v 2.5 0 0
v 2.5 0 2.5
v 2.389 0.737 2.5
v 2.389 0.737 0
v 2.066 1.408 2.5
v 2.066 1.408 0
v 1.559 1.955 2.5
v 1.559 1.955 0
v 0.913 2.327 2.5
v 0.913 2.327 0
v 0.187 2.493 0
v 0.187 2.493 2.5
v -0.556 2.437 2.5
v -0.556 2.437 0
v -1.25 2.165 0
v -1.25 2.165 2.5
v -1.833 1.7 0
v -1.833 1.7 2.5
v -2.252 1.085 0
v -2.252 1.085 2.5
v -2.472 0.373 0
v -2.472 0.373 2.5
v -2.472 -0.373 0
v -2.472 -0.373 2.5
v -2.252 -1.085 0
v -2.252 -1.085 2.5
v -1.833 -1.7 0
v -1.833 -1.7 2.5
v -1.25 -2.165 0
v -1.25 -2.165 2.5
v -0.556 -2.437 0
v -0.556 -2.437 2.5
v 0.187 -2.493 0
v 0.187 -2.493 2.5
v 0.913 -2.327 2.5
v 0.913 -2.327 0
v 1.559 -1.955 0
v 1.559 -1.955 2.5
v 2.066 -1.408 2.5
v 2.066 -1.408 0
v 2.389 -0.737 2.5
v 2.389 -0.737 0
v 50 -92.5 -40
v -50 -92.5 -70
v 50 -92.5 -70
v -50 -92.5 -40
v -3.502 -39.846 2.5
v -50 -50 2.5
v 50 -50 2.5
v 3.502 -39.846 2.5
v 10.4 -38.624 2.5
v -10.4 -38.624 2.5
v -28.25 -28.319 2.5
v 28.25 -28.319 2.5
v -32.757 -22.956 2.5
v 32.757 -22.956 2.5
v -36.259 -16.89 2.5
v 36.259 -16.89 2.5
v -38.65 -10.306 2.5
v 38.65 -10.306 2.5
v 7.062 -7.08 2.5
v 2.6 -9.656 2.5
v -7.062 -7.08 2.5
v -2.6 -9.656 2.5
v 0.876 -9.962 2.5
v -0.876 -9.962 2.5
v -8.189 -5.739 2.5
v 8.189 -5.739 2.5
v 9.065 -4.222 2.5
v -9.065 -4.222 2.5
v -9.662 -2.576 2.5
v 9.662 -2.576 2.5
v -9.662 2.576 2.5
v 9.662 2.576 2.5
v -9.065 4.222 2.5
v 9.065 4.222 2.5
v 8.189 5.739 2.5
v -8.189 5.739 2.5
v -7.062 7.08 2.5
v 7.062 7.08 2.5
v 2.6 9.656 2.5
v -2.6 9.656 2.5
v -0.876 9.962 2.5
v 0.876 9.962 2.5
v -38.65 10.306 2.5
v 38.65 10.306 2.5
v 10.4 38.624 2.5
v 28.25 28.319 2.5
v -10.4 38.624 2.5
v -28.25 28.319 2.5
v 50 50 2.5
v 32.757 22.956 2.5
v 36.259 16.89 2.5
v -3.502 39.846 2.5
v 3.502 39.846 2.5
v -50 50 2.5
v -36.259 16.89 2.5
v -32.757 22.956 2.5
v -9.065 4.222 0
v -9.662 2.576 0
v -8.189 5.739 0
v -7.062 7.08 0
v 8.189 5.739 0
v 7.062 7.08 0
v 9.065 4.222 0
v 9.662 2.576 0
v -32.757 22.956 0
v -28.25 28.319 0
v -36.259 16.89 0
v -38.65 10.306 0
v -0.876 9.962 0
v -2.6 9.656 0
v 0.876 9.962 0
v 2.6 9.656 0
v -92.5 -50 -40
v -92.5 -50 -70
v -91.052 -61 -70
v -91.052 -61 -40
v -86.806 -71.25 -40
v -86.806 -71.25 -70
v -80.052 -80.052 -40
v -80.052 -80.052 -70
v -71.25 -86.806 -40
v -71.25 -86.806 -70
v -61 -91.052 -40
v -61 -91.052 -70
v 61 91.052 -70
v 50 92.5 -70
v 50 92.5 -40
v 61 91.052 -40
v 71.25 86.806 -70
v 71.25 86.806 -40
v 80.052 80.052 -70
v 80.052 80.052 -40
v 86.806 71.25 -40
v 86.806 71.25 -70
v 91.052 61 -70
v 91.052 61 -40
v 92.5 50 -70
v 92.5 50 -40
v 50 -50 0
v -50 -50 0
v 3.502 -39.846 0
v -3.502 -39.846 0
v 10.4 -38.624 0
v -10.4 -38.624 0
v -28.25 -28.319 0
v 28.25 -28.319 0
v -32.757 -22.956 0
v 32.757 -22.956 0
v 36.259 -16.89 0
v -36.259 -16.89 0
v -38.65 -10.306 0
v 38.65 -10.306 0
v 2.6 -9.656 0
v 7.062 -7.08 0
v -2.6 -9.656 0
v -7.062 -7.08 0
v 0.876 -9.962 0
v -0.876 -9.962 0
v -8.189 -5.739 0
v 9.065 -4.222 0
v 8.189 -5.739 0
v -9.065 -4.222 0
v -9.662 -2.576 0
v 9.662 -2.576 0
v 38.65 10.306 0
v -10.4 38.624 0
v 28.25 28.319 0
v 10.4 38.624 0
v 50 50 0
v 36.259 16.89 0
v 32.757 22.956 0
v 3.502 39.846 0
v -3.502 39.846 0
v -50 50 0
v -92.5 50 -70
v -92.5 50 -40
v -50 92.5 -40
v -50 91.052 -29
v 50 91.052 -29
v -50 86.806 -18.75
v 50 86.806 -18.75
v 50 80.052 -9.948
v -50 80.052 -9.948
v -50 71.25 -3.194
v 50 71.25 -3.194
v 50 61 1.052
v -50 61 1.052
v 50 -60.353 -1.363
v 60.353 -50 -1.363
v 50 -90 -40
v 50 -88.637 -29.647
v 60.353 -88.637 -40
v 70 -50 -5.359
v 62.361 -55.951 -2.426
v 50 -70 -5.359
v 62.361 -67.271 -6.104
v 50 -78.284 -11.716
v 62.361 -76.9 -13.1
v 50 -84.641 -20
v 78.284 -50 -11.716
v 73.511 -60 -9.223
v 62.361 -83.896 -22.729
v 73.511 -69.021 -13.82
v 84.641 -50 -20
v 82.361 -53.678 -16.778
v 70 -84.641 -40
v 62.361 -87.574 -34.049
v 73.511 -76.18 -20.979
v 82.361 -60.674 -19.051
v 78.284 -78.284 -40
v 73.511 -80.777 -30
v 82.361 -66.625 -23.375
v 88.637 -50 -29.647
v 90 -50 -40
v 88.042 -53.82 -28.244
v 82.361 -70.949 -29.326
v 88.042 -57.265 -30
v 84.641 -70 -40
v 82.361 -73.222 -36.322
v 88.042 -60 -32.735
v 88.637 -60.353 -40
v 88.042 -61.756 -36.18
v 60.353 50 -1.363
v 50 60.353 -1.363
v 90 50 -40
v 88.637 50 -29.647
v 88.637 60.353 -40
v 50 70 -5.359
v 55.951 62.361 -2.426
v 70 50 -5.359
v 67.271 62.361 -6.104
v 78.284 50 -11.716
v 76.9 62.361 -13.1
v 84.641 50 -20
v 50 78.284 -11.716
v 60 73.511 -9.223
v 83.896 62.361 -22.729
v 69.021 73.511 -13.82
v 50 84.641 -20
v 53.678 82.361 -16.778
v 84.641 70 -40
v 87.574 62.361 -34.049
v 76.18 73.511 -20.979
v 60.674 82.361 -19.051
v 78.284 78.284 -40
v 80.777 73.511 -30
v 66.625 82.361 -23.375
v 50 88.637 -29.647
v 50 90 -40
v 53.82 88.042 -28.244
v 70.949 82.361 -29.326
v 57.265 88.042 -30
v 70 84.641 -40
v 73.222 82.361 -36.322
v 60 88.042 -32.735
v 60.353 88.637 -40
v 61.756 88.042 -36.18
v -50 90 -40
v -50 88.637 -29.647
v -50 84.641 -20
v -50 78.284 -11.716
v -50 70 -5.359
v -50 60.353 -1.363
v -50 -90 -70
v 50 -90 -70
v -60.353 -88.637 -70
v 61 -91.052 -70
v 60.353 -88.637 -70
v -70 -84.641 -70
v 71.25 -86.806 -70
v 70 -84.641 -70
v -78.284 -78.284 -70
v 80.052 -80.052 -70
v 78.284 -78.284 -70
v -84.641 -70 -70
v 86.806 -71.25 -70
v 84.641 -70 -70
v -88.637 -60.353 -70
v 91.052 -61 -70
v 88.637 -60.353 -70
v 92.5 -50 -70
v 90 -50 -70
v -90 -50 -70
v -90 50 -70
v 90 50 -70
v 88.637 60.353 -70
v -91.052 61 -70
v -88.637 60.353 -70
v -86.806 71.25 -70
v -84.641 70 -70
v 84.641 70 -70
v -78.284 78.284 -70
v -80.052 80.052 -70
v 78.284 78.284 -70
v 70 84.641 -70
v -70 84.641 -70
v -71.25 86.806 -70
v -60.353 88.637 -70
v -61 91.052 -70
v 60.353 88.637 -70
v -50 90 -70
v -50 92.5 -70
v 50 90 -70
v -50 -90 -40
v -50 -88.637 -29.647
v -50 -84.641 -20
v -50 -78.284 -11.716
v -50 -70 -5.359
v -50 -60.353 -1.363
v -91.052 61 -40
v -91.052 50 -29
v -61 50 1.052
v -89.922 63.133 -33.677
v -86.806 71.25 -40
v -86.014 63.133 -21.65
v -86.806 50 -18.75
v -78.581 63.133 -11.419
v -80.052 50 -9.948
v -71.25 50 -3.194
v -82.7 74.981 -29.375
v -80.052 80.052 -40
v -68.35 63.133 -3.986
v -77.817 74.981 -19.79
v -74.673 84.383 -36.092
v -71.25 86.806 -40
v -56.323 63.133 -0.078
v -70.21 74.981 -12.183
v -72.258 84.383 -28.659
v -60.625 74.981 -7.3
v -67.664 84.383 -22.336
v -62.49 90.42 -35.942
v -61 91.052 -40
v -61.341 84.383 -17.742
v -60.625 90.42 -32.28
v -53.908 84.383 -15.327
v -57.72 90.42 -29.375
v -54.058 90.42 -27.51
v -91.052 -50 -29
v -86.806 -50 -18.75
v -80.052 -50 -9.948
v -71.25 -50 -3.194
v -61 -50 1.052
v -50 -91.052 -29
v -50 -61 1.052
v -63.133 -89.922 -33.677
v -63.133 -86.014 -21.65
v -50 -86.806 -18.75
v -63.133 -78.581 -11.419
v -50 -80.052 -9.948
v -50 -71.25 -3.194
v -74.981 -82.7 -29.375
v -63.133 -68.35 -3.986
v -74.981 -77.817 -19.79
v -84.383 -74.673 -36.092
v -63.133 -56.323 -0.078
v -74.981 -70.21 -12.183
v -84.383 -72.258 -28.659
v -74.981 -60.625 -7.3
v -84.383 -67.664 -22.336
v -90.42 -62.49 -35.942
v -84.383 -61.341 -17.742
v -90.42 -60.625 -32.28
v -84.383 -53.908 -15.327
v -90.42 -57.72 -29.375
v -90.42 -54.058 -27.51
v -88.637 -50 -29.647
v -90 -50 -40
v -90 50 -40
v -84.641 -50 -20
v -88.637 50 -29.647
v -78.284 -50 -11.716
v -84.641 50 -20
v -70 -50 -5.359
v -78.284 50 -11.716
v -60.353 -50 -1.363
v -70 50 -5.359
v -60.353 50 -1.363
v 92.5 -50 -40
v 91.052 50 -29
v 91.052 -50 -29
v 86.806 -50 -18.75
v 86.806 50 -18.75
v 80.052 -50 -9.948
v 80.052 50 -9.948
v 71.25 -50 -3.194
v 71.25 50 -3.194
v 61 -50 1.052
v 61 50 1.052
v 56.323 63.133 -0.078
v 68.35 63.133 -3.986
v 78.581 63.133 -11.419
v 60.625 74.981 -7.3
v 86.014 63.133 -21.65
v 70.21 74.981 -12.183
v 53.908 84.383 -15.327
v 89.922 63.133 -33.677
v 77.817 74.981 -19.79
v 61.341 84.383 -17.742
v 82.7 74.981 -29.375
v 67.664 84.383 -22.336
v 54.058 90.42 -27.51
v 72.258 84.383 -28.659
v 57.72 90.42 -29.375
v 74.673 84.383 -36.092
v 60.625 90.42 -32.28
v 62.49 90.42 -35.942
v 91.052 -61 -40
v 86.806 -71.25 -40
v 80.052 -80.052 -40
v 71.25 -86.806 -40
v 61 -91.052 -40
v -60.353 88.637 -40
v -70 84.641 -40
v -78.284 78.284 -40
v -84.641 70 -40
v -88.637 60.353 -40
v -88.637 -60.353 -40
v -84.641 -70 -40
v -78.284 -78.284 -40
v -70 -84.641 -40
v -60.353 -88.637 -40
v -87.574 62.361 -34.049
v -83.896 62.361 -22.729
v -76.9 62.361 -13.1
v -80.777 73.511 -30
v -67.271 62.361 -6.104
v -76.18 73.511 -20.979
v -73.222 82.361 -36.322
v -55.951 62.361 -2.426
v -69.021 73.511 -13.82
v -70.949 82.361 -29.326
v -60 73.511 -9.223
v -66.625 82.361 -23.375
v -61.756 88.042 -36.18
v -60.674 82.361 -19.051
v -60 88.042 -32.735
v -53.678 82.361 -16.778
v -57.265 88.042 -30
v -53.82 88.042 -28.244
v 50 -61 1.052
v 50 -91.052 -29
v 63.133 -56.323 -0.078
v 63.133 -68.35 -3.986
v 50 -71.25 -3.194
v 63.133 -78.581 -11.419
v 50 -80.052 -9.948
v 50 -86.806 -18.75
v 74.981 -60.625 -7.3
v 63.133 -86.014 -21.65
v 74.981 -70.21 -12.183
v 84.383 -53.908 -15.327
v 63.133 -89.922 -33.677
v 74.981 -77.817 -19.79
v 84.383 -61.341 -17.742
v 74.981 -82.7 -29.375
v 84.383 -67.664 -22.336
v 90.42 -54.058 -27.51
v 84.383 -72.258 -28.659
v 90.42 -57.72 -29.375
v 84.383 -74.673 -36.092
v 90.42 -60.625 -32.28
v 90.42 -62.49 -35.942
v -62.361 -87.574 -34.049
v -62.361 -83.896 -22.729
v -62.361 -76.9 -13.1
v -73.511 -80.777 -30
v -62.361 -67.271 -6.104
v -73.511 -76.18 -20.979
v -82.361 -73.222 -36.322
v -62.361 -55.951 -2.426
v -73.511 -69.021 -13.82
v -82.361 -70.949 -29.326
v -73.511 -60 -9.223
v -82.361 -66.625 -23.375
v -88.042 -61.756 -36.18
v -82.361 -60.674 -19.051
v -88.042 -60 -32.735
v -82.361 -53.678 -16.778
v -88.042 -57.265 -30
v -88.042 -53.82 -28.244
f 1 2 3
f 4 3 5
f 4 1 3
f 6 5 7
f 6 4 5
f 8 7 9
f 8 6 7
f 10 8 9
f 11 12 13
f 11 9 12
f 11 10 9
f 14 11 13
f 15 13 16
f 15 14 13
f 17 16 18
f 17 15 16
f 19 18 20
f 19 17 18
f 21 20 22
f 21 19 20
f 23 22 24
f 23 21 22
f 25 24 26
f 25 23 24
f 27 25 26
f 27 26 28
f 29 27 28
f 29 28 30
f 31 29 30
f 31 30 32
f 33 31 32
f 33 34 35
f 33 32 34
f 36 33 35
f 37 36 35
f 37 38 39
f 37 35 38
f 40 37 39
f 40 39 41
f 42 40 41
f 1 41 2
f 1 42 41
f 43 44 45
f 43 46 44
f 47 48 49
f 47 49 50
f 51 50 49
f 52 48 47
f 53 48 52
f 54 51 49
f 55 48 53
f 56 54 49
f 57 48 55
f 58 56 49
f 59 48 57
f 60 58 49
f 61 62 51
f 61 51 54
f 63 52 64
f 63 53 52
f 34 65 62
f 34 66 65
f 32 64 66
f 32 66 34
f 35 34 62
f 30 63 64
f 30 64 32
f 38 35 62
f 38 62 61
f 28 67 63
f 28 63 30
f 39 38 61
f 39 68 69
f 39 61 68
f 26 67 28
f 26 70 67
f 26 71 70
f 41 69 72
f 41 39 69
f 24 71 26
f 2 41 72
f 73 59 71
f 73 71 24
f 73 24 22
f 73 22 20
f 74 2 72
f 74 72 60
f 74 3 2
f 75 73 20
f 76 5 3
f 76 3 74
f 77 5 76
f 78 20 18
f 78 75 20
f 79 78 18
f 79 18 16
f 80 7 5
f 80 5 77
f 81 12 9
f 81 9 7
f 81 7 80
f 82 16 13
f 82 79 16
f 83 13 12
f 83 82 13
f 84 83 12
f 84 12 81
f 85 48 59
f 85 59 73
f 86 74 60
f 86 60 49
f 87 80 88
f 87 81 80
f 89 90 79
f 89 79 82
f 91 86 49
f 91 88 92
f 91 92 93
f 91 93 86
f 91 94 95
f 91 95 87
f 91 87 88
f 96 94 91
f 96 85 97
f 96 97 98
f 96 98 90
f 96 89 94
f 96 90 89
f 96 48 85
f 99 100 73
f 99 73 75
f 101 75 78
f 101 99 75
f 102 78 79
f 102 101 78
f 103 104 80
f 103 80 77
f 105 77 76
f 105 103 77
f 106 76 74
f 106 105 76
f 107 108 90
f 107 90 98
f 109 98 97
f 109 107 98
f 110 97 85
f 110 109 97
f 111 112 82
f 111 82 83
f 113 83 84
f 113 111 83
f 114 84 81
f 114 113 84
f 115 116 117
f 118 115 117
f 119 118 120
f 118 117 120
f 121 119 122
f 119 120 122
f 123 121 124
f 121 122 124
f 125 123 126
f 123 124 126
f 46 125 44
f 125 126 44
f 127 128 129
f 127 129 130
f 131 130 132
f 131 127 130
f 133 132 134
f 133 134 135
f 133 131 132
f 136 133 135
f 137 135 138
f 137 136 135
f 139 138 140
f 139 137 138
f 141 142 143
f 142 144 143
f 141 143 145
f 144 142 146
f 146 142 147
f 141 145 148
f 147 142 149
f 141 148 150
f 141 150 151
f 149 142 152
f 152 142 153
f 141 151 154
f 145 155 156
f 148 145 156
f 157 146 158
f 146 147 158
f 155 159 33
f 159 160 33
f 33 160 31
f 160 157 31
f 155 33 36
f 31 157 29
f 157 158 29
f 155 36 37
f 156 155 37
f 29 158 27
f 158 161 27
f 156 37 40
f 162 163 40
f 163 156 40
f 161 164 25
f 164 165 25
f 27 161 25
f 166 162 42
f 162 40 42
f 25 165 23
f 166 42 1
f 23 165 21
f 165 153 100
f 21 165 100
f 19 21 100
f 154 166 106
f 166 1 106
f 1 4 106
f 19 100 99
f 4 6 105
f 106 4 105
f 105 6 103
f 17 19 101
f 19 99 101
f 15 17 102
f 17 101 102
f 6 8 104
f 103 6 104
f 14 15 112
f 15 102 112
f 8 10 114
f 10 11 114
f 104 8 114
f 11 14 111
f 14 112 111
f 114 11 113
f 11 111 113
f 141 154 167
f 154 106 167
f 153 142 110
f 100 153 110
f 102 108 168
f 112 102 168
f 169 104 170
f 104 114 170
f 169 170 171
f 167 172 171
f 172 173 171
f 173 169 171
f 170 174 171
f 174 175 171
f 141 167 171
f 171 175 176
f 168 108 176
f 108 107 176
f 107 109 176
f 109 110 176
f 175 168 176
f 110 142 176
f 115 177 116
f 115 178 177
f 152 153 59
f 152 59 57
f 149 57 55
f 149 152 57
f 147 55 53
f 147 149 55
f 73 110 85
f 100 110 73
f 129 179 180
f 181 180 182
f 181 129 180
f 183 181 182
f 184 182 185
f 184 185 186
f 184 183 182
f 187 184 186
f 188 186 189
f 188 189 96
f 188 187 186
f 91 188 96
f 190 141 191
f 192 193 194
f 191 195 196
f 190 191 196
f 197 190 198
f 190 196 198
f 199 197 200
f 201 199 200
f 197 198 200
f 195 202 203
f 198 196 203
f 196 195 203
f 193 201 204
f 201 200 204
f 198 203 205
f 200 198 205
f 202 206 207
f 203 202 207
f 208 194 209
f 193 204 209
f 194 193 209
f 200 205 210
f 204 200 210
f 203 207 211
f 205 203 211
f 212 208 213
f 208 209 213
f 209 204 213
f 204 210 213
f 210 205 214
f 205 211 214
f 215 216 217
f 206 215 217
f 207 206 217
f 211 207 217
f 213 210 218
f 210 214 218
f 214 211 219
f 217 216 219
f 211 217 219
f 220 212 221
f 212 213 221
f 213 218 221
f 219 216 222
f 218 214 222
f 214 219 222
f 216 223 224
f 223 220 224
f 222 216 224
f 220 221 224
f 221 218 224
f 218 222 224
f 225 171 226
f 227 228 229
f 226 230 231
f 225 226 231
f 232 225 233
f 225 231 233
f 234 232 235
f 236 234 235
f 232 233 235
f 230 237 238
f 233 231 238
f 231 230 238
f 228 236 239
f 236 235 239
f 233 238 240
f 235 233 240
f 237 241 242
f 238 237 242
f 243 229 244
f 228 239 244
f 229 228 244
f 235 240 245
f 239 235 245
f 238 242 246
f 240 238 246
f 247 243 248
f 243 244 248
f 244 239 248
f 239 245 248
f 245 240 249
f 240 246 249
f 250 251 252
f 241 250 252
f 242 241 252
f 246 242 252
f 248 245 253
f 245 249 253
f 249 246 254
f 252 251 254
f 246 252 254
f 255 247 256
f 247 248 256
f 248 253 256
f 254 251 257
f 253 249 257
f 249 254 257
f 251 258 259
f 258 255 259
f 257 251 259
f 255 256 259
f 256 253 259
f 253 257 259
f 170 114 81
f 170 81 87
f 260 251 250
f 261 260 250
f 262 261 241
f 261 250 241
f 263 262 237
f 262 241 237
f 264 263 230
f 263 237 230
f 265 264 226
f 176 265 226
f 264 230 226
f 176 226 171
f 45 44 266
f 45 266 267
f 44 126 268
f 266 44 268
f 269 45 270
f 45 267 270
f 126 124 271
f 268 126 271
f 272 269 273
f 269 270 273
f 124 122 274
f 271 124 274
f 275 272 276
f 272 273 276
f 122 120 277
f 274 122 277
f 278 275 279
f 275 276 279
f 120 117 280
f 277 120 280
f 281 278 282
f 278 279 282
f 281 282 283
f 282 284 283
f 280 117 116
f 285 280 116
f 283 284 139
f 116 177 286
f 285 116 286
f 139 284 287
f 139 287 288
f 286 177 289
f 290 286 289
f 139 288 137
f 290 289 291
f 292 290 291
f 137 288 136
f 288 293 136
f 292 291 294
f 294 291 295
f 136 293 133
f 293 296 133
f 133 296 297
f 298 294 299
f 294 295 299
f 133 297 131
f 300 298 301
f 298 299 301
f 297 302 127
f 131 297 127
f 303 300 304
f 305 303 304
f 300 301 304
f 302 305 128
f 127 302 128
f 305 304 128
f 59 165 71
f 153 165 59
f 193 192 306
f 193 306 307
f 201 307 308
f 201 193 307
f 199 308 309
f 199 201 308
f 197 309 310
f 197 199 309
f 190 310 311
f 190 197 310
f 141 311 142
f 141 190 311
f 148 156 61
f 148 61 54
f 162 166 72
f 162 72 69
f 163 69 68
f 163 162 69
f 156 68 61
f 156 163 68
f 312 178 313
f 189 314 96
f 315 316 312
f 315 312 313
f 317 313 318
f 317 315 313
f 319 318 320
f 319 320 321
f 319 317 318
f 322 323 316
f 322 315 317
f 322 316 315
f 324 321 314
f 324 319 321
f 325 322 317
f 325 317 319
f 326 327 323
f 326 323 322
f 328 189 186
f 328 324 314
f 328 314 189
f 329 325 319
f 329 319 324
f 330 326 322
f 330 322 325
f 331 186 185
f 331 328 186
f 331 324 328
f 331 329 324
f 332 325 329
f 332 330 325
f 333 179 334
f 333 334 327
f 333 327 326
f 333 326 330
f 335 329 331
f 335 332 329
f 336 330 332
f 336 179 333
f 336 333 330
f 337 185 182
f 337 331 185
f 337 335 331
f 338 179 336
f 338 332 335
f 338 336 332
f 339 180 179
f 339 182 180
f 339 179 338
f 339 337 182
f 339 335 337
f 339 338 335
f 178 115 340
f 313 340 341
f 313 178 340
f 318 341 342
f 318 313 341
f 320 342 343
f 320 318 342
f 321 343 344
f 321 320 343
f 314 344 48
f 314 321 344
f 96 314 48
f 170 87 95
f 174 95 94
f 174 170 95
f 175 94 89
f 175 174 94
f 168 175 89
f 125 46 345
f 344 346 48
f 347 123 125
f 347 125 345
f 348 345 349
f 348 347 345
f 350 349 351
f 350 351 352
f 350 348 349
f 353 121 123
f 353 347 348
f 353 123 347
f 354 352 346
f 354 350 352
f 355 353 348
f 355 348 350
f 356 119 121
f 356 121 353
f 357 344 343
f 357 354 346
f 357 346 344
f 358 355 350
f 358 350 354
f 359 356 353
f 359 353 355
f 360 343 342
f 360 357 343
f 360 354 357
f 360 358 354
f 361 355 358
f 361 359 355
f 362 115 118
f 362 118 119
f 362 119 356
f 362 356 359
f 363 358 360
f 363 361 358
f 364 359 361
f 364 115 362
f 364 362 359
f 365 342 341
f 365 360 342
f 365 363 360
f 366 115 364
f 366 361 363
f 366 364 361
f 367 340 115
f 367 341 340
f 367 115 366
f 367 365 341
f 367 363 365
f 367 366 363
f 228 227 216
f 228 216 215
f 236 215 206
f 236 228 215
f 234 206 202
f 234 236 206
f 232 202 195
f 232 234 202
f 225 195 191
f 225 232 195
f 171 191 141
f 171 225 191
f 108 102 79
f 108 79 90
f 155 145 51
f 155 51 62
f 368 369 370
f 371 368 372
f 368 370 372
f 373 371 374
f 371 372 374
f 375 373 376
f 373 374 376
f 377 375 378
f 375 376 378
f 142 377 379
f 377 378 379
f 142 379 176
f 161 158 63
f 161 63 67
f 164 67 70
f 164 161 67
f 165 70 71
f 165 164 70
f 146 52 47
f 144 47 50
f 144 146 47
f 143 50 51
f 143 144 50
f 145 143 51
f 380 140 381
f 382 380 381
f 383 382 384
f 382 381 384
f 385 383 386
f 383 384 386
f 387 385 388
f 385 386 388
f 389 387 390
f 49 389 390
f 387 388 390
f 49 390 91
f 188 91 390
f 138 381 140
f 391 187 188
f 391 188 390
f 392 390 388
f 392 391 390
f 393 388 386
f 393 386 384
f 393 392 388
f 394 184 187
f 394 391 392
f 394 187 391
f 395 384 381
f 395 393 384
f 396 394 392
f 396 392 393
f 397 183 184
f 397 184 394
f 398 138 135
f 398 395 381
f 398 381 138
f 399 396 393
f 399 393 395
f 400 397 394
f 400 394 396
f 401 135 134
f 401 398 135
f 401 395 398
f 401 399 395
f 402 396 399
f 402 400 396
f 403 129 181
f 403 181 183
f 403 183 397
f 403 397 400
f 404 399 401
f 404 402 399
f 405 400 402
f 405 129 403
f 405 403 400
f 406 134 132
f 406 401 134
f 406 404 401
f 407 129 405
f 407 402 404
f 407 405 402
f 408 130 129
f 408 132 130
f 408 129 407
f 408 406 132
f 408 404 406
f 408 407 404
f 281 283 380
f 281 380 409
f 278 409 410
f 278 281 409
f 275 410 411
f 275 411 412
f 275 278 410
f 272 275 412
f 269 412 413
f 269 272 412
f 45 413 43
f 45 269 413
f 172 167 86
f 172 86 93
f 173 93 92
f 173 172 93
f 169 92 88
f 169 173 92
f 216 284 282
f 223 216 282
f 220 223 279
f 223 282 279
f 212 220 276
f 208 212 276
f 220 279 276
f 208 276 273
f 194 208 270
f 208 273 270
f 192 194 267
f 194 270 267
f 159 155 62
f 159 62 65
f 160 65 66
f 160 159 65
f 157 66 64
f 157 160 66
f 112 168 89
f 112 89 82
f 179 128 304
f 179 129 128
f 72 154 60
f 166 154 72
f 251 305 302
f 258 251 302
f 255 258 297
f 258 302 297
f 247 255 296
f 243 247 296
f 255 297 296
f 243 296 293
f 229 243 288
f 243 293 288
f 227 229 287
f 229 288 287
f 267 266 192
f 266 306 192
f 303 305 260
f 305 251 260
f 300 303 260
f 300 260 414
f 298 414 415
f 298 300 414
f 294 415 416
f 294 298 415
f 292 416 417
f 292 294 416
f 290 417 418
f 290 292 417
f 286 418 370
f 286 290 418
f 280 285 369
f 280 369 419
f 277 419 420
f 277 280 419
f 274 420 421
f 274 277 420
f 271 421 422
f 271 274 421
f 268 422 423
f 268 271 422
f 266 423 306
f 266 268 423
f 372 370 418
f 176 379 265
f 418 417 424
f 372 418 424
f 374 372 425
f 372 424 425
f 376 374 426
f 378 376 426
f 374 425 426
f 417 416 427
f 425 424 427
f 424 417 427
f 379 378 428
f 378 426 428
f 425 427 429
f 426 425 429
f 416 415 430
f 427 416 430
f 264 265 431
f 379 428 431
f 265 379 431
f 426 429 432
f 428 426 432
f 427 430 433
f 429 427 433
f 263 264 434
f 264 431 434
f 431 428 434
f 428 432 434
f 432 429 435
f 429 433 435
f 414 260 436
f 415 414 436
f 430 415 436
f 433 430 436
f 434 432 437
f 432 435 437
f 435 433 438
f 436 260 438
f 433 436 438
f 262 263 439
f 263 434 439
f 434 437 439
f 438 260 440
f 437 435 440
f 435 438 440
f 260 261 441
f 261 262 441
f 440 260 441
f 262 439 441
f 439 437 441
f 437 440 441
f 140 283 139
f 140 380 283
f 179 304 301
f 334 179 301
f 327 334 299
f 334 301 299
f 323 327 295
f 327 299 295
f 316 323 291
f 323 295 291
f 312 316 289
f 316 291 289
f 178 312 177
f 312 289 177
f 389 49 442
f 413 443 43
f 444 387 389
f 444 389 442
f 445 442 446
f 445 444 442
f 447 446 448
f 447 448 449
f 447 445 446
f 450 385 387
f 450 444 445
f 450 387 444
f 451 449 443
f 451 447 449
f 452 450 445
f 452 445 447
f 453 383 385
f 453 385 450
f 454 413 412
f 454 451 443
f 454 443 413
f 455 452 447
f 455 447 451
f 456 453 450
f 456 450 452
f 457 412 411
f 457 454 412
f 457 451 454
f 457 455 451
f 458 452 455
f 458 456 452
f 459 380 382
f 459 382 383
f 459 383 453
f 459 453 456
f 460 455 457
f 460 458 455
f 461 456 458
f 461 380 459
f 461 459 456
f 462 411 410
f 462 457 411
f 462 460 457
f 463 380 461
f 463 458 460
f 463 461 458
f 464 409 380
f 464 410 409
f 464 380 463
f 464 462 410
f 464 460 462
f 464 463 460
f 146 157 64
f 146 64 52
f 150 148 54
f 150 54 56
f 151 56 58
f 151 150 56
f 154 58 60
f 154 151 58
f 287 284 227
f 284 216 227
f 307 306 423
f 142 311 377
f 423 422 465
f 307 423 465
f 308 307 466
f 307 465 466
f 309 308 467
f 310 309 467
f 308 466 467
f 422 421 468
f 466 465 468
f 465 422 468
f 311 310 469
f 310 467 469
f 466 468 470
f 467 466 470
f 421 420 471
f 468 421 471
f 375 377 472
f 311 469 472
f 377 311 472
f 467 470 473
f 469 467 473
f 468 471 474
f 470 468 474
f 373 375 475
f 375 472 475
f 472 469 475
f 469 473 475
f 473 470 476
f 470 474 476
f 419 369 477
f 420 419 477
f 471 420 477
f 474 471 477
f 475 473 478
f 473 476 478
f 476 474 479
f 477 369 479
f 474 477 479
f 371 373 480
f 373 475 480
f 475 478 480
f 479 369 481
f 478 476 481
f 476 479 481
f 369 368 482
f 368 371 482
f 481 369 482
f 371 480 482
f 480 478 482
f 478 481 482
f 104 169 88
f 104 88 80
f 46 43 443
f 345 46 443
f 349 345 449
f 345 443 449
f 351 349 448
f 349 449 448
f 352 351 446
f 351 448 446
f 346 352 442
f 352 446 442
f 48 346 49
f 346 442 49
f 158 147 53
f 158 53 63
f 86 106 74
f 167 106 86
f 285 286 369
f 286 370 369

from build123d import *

# Parameters (mm, degrees)
F2_W         = 180
F2_H         = 180
F3_W         = 180
F3_H         = 180
F5_R         = 40
F6_T1_DEPTH  = 130
F6_S5_W      = 40
F6_S5_H      = 40
F6_T6_DEPTH  = 40
F6_S11_W     = 40
F6_S11_H     = 40
F6_T12_DEPTH = 40
F6_S17_W     = 40
F6_S17_H     = 40
F6_T18_DEPTH = 40
F6_S23_W     = 40
F6_S23_H     = 40
F6_T24_DEPTH = 40
F7_T         = 2.5
F0_R         = 2.5
F8_DEPTH     = 2.501


# Not quite as in the source:
# - a fillet or chamfer that OpenCascade refuses, or shapes differently, is made with other operations: its cross-section is extruded or revolved along the edge and cut away or added


with BuildPart() as f4:
    # F2 (on offset) → F4 section 0
    with BuildSketch(Plane.XY.offset(-70)):
        Rectangle(F2_W, F2_H)
    # F3 (on Top) → F4 section 1
    with BuildSketch(Plane.XY):
        Rectangle(F3_W, F3_H)
    loft()

    # F5
    f5_edges = [f4.edges().sort_by_distance(p)[0] for p in [
        (90, 0, 0),
        (0, -90, 0),
        (-90, 0, 0),
        (0, 90, 0),
    ]]
    fillet(f5_edges, radius=F5_R)

    # F6: fillet of radius 40 on 4 edges, made by hand

    # F6_s2 → F6_t1 (cut)
    with BuildSketch(Plane.XY.offset(-170)):
        with BuildLine():
            ThreePointArc((90, -50), (78.2842712475, -78.2842712475), (50, -90))
            Line((50, -90), (90, -90))
            Line((90, -90), (90, -50))
        make_face()
        with BuildLine():
            ThreePointArc((50, 90), (78.2842712475, 78.2842712475), (90, 50))
            Line((90, 50), (90, 90))
            Line((90, 90), (50, 90))
        make_face()
        with BuildLine():
            ThreePointArc((-50, 90), (-78.2842712475, 78.2842712475), (-90, 50))
            Line((-90, 50), (-90, 90))
            Line((-90, 90), (-50, 90))
        make_face()
        with BuildLine():
            ThreePointArc((-90, -50), (-78.2842712475, -78.2842712475), (-50, -90))
            Line((-50, -90), (-90, -90))
            Line((-90, -90), (-90, -50))
        make_face()
    extrude(amount=F6_T1_DEPTH, mode=Mode.SUBTRACT)


with BuildPart() as f6_tool4:
    # F6_s5 → F6_t6 (new body)
    with BuildSketch(Plane.YZ.offset(-50)):
        with Locations((-70, -20)):
            Rectangle(F6_S5_W, F6_S5_H)
    extrude(amount=-F6_T6_DEPTH)

    # F6_s7 → F6_t8 (revolve, cut)
    with BuildSketch(Plane(origin=(-50, -50, -40), x_dir=(0, 0.7071067812, -0.7071067812), z_dir=(0, 0.7071067812, 0.7071067812))):
        with BuildLine():
            ThreePointArc((0, -40), (40, 0), (0, 40))
            Line((0, 40), (0, -40))
        make_face()
    revolve(axis=Axis((-50, -50, -40), (-1, 0, 0)), mode=Mode.SUBTRACT)


with BuildPart() as f4_1:
    add(f4.part)

    # F6_t3: cut F6_tool4
    add(f6_tool4.part, mode=Mode.SUBTRACT)


with BuildPart() as f6_tool10:
    # F6_s11 → F6_t12 (new body)
    with BuildSketch(Plane.XZ.offset(-50)):
        with Locations((-70, -20)):
            Rectangle(F6_S11_W, F6_S11_H)
    extrude(amount=-F6_T12_DEPTH)

    # F6_s13 → F6_t14 (revolve, cut)
    with BuildSketch(Plane(origin=(-50, 50, -40), x_dir=(0.7071067812, 0, -0.7071067812), z_dir=(0.7071067812, 0, 0.7071067812))):
        with BuildLine():
            ThreePointArc((0, -40), (40, 0), (0, 40))
            Line((0, 40), (0, -40))
        make_face()
    revolve(axis=Axis((-50, 50, -40), (0, 1, 0)), mode=Mode.SUBTRACT)


with BuildPart() as f4_2:
    add(f4_1.part)

    # F6_t9: cut F6_tool10
    add(f6_tool10.part, mode=Mode.SUBTRACT)


with BuildPart() as f6_tool16:
    # F6_s17 → F6_t18 (new body)
    with BuildSketch(Plane.XZ.offset(-50)):
        with Locations((70, -20)):
            Rectangle(F6_S17_W, F6_S17_H)
    extrude(amount=-F6_T18_DEPTH)

    # F6_s19 → F6_t20 (revolve, cut)
    with BuildSketch(Plane(origin=(50, 50, -40), x_dir=(-0.7071067812, 0, -0.7071067812), z_dir=(0.7071067812, 0, -0.7071067812))):
        with BuildLine():
            ThreePointArc((0, -40), (40, 0), (0, 40))
            Line((0, 40), (0, -40))
        make_face()
    revolve(axis=Axis((50, 50, -40), (0, 1, 0)), mode=Mode.SUBTRACT)


with BuildPart() as f4_3:
    add(f4_2.part)

    # F6_t15: cut F6_tool16
    add(f6_tool16.part, mode=Mode.SUBTRACT)


with BuildPart() as f6_tool22:
    # F6_s23 → F6_t24 (new body)
    with BuildSketch(Plane.YZ.offset(50)):
        with Locations((-70, -20)):
            Rectangle(F6_S23_W, F6_S23_H)
    extrude(amount=F6_T24_DEPTH)

    # F6_s25 → F6_t26 (revolve, cut)
    with BuildSketch(Plane(origin=(50, -50, -40), x_dir=(0, 0.7071067812, -0.7071067812), z_dir=(0, -0.7071067812, -0.7071067812))):
        with BuildLine():
            ThreePointArc((0, -40), (40, 0), (0, 40))
            Line((0, 40), (0, -40))
        make_face()
    revolve(axis=Axis((50, -50, -40), (1, 0, 0)), mode=Mode.SUBTRACT)


with BuildPart() as f4_4:
    add(f4_3.part)

    # F6_t21: cut F6_tool22
    add(f6_tool22.part, mode=Mode.SUBTRACT)

    # F7
    f7_openings = [f4_4.faces().sort_by_distance(p)[0] for p in [
        (0, 0, -70),
    ]]
    offset(amount=F7_T, openings=f7_openings)

    # F0 (on Top) → F8 (cut, through all)
    with BuildSketch(Plane.XY):
        with BuildLine():
            Line((-10.4, 38.6243446546), (-2.6, 9.6560861637))
            ThreePointArc((-2.6, 9.6560861637), (0, 10), (2.6, 9.6560861637))
            Line((2.6, 9.6560861637), (10.4, 38.6243446546))
            ThreePointArc((10.4, 38.6243446546), (0, 40), (-10.4, 38.6243446546))
        make_face()
        with BuildLine():
            ThreePointArc((-9.6624159189, 2.576377032), (-8.6602540378, 5), (-7.0624159189, 7.0797091317))
            Line((-7.0624159189, 7.0797091317), (-28.2496636754, 28.3188365267))
            ThreePointArc((-28.2496636754, 28.3188365267), (-34.6410161514, 20), (-38.6496636754, 10.305508128))
            Line((-38.6496636754, 10.305508128), (-9.6624159189, 2.576377032))
        make_face()
        with BuildLine():
            ThreePointArc((-7.0624159189, -7.0797091317), (-8.6602540378, -5), (-9.6624159189, -2.576377032))
            Line((-9.6624159189, -2.576377032), (-38.6496636754, -10.305508128))
            ThreePointArc((-38.6496636754, -10.305508128), (-34.6410161514, -20), (-28.2496636754, -28.3188365267))
            Line((-28.2496636754, -28.3188365267), (-7.0624159189, -7.0797091317))
        make_face()
        with BuildLine():
            ThreePointArc((2.6, -9.6560861637), (0, -10), (-2.6, -9.6560861637))
            Line((-2.6, -9.6560861637), (-10.4, -38.6243446546))
            ThreePointArc((-10.4, -38.6243446546), (0, -40), (10.4, -38.6243446546))
            Line((10.4, -38.6243446546), (2.6, -9.6560861637))
        make_face()
        with BuildLine():
            ThreePointArc((9.6624159189, -2.576377032), (8.6602540378, -5), (7.0624159189, -7.0797091317))
            Line((7.0624159189, -7.0797091317), (28.2496636754, -28.3188365267))
            ThreePointArc((28.2496636754, -28.3188365267), (34.6410161514, -20), (38.6496636754, -10.305508128))
            Line((38.6496636754, -10.305508128), (9.6624159189, -2.576377032))
        make_face()
        with BuildLine():
            ThreePointArc((7.0624159189, 7.0797091317), (8.6602540378, 5), (9.6624159189, 2.576377032))
            Line((9.6624159189, 2.576377032), (38.6496636754, 10.305508128))
            ThreePointArc((38.6496636754, 10.305508128), (34.6410161514, 20), (28.2496636754, 28.3188365267))
            Line((28.2496636754, 28.3188365267), (7.0624159189, 7.0797091317))
        make_face()
        Circle(F0_R)
    extrude(amount=F8_DEPTH, mode=Mode.SUBTRACT)


solid = f4_4.part
